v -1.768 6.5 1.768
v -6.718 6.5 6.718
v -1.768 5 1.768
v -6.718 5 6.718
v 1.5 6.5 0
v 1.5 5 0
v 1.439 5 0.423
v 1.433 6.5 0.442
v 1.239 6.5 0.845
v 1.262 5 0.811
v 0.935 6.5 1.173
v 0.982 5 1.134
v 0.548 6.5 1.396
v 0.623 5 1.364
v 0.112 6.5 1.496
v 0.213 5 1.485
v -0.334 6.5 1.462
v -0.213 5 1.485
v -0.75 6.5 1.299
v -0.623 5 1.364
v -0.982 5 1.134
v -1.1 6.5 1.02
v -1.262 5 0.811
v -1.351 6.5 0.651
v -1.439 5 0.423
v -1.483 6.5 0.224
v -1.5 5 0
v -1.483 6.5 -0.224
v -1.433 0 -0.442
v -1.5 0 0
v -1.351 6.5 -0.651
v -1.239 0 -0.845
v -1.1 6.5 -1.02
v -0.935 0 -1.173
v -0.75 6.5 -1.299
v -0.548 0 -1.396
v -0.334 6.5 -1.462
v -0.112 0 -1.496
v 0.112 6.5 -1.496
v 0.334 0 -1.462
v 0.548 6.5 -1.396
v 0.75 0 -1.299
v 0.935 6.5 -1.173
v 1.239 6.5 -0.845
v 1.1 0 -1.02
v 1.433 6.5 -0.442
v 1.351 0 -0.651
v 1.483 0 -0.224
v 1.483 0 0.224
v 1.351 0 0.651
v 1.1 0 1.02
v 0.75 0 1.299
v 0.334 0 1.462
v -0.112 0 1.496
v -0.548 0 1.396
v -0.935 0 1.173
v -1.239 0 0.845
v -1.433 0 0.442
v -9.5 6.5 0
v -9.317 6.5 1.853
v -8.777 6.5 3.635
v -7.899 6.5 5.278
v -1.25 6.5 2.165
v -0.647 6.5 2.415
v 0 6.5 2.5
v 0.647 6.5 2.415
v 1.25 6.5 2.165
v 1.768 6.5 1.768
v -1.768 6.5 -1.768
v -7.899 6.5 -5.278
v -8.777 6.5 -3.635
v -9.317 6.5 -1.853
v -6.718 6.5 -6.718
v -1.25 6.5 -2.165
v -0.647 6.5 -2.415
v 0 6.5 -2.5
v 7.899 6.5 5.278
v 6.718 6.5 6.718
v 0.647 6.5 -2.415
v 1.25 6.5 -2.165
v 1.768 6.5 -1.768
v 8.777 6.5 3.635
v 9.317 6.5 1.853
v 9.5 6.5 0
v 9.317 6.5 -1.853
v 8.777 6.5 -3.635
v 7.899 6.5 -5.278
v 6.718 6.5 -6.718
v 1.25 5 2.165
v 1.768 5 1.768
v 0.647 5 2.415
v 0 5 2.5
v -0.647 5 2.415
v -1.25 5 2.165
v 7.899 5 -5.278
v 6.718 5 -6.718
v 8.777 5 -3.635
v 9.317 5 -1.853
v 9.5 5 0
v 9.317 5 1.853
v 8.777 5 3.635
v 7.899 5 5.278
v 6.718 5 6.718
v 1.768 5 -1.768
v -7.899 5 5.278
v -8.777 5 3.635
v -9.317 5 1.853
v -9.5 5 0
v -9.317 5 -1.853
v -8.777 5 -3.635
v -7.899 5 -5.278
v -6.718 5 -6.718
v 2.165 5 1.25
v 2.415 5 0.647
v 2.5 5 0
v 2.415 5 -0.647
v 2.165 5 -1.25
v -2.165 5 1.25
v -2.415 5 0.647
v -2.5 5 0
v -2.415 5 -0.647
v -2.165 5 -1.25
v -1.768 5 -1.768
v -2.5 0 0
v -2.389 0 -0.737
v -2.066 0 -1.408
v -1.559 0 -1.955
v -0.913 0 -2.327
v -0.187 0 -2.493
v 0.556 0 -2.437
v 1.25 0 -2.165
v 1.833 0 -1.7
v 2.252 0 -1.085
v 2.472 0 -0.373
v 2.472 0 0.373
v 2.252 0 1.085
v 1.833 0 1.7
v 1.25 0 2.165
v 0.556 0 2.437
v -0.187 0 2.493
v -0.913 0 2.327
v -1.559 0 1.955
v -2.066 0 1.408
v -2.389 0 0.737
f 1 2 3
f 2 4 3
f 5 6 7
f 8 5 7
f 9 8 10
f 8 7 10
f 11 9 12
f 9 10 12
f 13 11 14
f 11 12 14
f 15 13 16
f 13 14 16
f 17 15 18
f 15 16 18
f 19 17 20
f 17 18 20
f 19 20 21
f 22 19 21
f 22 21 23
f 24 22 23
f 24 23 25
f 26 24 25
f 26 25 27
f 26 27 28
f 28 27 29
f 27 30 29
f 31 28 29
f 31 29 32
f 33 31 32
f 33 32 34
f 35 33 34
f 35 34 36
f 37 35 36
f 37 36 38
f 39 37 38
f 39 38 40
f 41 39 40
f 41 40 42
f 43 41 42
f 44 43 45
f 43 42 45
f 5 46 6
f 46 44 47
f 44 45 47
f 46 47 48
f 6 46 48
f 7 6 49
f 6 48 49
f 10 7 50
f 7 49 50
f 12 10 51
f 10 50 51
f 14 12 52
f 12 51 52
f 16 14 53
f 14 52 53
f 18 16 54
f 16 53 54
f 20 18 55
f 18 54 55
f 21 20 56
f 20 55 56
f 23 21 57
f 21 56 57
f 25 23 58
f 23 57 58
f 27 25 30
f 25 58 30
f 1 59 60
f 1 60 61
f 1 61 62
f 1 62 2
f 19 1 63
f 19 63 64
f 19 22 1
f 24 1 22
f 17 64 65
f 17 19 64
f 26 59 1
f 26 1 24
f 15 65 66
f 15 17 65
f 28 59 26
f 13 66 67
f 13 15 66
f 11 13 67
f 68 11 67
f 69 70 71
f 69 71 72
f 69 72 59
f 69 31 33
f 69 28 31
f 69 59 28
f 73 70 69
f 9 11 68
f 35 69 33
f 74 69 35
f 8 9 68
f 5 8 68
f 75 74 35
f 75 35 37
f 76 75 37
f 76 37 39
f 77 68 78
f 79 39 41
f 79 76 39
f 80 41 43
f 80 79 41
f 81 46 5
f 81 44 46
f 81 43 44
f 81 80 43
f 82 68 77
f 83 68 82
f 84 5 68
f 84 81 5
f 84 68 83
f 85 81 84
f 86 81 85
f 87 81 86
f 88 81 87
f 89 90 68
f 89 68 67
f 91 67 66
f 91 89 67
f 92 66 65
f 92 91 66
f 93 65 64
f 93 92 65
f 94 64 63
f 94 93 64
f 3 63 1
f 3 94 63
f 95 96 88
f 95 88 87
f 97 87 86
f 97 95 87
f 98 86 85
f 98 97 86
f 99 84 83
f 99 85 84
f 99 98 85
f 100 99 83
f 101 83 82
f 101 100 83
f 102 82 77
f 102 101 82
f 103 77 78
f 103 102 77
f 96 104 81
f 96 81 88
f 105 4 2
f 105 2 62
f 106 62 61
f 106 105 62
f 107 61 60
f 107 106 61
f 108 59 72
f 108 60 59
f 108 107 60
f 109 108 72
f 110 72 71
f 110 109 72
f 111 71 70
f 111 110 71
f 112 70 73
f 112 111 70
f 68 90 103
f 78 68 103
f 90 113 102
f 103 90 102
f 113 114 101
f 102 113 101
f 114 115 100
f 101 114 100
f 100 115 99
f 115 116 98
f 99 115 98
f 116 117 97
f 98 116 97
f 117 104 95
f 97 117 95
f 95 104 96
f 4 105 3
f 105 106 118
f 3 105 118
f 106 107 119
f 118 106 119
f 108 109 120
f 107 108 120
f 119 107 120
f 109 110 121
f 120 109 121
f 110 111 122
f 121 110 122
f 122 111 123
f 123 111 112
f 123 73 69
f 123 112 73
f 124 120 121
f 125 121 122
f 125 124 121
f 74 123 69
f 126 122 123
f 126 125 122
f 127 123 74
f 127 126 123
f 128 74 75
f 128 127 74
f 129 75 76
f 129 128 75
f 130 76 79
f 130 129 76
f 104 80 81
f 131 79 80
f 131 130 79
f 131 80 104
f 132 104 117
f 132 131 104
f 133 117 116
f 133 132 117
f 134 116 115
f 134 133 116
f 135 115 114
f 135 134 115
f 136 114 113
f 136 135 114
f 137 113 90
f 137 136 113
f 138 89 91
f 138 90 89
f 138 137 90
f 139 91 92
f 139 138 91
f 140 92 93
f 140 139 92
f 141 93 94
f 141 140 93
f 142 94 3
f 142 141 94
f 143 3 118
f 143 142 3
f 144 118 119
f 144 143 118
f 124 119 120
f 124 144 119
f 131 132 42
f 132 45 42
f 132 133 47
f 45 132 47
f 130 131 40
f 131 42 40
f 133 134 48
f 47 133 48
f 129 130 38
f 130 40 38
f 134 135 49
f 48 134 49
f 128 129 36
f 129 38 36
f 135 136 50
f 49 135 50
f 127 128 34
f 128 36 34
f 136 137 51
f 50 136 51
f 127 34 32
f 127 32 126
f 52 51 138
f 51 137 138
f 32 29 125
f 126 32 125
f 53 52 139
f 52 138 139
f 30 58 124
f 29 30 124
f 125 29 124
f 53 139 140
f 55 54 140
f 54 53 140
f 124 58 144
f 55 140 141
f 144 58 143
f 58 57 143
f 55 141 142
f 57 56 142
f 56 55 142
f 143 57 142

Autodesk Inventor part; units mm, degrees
ref_plane "YZ Plane" through (0, 0, 0) normal (1, 0, 0) x (0, 1, 0)
ref_plane "XZ Plane" through (0, 0, 0) normal (0, 1, 0) x (-1, 0, 0)
ref_plane "XY Plane" through (0, 0, 0) normal (0, 0, 1) x (1, 0, 0)
sketch "Sketch1" plane through (0, 0, 0) normal (0, 1, 0) x (-1, 0, 0)
  circle A0 centre (0, 0) radius 2.5
  circle A1 centre (0, 0) radius 1.5
  dimension "d1" = 3
  dimension "d2" = 1
extrude "Extrusion1" add sketch "Sketch1" along normal blind 5
sketch "Sketch2" plane through (0, 5, 0) normal (0, 1, 0) x (1, 0, 0)
  circle A0 centre (0, 0) radius 1.5 projected
  circle A1 centre (0, 0) radius 9.5
  line L0 (-6.7175, -6.7175) -> (6.7175, 6.7175)
  line L1 (-6.7175, 6.7175) -> (6.7175, -6.7175)
  line L2 (-9.5, 0) -> (9.5, 0) construction
  circle A2 centre (0, 0) radius 2.5 projected
  point P0 (1.7678, -1.7678)
  point P1 (1.7678, 1.7678)
  point P2 (-1.7678, 1.7678)
  point P3 (-1.7678, -1.7678)
  dimension "d5" = 19
  dimension "d6" = 45
  dimension "d7" = 45
extrude "Extrusion2" add sketch "Sketch2" along normal blind 1.5 contours A0 L0 A2 L1 | A0 L1 A2 L0 | L1 A2 L0 A0 | A0 L0 A2 L1 | L0 A1 L1 A2 | A2 L0 A1 L1 picked at (6.8013, -2.1485) picked at (-6.4568, -3.0059)
equation "\"d7\" = d6"
properties part number "Helice"
